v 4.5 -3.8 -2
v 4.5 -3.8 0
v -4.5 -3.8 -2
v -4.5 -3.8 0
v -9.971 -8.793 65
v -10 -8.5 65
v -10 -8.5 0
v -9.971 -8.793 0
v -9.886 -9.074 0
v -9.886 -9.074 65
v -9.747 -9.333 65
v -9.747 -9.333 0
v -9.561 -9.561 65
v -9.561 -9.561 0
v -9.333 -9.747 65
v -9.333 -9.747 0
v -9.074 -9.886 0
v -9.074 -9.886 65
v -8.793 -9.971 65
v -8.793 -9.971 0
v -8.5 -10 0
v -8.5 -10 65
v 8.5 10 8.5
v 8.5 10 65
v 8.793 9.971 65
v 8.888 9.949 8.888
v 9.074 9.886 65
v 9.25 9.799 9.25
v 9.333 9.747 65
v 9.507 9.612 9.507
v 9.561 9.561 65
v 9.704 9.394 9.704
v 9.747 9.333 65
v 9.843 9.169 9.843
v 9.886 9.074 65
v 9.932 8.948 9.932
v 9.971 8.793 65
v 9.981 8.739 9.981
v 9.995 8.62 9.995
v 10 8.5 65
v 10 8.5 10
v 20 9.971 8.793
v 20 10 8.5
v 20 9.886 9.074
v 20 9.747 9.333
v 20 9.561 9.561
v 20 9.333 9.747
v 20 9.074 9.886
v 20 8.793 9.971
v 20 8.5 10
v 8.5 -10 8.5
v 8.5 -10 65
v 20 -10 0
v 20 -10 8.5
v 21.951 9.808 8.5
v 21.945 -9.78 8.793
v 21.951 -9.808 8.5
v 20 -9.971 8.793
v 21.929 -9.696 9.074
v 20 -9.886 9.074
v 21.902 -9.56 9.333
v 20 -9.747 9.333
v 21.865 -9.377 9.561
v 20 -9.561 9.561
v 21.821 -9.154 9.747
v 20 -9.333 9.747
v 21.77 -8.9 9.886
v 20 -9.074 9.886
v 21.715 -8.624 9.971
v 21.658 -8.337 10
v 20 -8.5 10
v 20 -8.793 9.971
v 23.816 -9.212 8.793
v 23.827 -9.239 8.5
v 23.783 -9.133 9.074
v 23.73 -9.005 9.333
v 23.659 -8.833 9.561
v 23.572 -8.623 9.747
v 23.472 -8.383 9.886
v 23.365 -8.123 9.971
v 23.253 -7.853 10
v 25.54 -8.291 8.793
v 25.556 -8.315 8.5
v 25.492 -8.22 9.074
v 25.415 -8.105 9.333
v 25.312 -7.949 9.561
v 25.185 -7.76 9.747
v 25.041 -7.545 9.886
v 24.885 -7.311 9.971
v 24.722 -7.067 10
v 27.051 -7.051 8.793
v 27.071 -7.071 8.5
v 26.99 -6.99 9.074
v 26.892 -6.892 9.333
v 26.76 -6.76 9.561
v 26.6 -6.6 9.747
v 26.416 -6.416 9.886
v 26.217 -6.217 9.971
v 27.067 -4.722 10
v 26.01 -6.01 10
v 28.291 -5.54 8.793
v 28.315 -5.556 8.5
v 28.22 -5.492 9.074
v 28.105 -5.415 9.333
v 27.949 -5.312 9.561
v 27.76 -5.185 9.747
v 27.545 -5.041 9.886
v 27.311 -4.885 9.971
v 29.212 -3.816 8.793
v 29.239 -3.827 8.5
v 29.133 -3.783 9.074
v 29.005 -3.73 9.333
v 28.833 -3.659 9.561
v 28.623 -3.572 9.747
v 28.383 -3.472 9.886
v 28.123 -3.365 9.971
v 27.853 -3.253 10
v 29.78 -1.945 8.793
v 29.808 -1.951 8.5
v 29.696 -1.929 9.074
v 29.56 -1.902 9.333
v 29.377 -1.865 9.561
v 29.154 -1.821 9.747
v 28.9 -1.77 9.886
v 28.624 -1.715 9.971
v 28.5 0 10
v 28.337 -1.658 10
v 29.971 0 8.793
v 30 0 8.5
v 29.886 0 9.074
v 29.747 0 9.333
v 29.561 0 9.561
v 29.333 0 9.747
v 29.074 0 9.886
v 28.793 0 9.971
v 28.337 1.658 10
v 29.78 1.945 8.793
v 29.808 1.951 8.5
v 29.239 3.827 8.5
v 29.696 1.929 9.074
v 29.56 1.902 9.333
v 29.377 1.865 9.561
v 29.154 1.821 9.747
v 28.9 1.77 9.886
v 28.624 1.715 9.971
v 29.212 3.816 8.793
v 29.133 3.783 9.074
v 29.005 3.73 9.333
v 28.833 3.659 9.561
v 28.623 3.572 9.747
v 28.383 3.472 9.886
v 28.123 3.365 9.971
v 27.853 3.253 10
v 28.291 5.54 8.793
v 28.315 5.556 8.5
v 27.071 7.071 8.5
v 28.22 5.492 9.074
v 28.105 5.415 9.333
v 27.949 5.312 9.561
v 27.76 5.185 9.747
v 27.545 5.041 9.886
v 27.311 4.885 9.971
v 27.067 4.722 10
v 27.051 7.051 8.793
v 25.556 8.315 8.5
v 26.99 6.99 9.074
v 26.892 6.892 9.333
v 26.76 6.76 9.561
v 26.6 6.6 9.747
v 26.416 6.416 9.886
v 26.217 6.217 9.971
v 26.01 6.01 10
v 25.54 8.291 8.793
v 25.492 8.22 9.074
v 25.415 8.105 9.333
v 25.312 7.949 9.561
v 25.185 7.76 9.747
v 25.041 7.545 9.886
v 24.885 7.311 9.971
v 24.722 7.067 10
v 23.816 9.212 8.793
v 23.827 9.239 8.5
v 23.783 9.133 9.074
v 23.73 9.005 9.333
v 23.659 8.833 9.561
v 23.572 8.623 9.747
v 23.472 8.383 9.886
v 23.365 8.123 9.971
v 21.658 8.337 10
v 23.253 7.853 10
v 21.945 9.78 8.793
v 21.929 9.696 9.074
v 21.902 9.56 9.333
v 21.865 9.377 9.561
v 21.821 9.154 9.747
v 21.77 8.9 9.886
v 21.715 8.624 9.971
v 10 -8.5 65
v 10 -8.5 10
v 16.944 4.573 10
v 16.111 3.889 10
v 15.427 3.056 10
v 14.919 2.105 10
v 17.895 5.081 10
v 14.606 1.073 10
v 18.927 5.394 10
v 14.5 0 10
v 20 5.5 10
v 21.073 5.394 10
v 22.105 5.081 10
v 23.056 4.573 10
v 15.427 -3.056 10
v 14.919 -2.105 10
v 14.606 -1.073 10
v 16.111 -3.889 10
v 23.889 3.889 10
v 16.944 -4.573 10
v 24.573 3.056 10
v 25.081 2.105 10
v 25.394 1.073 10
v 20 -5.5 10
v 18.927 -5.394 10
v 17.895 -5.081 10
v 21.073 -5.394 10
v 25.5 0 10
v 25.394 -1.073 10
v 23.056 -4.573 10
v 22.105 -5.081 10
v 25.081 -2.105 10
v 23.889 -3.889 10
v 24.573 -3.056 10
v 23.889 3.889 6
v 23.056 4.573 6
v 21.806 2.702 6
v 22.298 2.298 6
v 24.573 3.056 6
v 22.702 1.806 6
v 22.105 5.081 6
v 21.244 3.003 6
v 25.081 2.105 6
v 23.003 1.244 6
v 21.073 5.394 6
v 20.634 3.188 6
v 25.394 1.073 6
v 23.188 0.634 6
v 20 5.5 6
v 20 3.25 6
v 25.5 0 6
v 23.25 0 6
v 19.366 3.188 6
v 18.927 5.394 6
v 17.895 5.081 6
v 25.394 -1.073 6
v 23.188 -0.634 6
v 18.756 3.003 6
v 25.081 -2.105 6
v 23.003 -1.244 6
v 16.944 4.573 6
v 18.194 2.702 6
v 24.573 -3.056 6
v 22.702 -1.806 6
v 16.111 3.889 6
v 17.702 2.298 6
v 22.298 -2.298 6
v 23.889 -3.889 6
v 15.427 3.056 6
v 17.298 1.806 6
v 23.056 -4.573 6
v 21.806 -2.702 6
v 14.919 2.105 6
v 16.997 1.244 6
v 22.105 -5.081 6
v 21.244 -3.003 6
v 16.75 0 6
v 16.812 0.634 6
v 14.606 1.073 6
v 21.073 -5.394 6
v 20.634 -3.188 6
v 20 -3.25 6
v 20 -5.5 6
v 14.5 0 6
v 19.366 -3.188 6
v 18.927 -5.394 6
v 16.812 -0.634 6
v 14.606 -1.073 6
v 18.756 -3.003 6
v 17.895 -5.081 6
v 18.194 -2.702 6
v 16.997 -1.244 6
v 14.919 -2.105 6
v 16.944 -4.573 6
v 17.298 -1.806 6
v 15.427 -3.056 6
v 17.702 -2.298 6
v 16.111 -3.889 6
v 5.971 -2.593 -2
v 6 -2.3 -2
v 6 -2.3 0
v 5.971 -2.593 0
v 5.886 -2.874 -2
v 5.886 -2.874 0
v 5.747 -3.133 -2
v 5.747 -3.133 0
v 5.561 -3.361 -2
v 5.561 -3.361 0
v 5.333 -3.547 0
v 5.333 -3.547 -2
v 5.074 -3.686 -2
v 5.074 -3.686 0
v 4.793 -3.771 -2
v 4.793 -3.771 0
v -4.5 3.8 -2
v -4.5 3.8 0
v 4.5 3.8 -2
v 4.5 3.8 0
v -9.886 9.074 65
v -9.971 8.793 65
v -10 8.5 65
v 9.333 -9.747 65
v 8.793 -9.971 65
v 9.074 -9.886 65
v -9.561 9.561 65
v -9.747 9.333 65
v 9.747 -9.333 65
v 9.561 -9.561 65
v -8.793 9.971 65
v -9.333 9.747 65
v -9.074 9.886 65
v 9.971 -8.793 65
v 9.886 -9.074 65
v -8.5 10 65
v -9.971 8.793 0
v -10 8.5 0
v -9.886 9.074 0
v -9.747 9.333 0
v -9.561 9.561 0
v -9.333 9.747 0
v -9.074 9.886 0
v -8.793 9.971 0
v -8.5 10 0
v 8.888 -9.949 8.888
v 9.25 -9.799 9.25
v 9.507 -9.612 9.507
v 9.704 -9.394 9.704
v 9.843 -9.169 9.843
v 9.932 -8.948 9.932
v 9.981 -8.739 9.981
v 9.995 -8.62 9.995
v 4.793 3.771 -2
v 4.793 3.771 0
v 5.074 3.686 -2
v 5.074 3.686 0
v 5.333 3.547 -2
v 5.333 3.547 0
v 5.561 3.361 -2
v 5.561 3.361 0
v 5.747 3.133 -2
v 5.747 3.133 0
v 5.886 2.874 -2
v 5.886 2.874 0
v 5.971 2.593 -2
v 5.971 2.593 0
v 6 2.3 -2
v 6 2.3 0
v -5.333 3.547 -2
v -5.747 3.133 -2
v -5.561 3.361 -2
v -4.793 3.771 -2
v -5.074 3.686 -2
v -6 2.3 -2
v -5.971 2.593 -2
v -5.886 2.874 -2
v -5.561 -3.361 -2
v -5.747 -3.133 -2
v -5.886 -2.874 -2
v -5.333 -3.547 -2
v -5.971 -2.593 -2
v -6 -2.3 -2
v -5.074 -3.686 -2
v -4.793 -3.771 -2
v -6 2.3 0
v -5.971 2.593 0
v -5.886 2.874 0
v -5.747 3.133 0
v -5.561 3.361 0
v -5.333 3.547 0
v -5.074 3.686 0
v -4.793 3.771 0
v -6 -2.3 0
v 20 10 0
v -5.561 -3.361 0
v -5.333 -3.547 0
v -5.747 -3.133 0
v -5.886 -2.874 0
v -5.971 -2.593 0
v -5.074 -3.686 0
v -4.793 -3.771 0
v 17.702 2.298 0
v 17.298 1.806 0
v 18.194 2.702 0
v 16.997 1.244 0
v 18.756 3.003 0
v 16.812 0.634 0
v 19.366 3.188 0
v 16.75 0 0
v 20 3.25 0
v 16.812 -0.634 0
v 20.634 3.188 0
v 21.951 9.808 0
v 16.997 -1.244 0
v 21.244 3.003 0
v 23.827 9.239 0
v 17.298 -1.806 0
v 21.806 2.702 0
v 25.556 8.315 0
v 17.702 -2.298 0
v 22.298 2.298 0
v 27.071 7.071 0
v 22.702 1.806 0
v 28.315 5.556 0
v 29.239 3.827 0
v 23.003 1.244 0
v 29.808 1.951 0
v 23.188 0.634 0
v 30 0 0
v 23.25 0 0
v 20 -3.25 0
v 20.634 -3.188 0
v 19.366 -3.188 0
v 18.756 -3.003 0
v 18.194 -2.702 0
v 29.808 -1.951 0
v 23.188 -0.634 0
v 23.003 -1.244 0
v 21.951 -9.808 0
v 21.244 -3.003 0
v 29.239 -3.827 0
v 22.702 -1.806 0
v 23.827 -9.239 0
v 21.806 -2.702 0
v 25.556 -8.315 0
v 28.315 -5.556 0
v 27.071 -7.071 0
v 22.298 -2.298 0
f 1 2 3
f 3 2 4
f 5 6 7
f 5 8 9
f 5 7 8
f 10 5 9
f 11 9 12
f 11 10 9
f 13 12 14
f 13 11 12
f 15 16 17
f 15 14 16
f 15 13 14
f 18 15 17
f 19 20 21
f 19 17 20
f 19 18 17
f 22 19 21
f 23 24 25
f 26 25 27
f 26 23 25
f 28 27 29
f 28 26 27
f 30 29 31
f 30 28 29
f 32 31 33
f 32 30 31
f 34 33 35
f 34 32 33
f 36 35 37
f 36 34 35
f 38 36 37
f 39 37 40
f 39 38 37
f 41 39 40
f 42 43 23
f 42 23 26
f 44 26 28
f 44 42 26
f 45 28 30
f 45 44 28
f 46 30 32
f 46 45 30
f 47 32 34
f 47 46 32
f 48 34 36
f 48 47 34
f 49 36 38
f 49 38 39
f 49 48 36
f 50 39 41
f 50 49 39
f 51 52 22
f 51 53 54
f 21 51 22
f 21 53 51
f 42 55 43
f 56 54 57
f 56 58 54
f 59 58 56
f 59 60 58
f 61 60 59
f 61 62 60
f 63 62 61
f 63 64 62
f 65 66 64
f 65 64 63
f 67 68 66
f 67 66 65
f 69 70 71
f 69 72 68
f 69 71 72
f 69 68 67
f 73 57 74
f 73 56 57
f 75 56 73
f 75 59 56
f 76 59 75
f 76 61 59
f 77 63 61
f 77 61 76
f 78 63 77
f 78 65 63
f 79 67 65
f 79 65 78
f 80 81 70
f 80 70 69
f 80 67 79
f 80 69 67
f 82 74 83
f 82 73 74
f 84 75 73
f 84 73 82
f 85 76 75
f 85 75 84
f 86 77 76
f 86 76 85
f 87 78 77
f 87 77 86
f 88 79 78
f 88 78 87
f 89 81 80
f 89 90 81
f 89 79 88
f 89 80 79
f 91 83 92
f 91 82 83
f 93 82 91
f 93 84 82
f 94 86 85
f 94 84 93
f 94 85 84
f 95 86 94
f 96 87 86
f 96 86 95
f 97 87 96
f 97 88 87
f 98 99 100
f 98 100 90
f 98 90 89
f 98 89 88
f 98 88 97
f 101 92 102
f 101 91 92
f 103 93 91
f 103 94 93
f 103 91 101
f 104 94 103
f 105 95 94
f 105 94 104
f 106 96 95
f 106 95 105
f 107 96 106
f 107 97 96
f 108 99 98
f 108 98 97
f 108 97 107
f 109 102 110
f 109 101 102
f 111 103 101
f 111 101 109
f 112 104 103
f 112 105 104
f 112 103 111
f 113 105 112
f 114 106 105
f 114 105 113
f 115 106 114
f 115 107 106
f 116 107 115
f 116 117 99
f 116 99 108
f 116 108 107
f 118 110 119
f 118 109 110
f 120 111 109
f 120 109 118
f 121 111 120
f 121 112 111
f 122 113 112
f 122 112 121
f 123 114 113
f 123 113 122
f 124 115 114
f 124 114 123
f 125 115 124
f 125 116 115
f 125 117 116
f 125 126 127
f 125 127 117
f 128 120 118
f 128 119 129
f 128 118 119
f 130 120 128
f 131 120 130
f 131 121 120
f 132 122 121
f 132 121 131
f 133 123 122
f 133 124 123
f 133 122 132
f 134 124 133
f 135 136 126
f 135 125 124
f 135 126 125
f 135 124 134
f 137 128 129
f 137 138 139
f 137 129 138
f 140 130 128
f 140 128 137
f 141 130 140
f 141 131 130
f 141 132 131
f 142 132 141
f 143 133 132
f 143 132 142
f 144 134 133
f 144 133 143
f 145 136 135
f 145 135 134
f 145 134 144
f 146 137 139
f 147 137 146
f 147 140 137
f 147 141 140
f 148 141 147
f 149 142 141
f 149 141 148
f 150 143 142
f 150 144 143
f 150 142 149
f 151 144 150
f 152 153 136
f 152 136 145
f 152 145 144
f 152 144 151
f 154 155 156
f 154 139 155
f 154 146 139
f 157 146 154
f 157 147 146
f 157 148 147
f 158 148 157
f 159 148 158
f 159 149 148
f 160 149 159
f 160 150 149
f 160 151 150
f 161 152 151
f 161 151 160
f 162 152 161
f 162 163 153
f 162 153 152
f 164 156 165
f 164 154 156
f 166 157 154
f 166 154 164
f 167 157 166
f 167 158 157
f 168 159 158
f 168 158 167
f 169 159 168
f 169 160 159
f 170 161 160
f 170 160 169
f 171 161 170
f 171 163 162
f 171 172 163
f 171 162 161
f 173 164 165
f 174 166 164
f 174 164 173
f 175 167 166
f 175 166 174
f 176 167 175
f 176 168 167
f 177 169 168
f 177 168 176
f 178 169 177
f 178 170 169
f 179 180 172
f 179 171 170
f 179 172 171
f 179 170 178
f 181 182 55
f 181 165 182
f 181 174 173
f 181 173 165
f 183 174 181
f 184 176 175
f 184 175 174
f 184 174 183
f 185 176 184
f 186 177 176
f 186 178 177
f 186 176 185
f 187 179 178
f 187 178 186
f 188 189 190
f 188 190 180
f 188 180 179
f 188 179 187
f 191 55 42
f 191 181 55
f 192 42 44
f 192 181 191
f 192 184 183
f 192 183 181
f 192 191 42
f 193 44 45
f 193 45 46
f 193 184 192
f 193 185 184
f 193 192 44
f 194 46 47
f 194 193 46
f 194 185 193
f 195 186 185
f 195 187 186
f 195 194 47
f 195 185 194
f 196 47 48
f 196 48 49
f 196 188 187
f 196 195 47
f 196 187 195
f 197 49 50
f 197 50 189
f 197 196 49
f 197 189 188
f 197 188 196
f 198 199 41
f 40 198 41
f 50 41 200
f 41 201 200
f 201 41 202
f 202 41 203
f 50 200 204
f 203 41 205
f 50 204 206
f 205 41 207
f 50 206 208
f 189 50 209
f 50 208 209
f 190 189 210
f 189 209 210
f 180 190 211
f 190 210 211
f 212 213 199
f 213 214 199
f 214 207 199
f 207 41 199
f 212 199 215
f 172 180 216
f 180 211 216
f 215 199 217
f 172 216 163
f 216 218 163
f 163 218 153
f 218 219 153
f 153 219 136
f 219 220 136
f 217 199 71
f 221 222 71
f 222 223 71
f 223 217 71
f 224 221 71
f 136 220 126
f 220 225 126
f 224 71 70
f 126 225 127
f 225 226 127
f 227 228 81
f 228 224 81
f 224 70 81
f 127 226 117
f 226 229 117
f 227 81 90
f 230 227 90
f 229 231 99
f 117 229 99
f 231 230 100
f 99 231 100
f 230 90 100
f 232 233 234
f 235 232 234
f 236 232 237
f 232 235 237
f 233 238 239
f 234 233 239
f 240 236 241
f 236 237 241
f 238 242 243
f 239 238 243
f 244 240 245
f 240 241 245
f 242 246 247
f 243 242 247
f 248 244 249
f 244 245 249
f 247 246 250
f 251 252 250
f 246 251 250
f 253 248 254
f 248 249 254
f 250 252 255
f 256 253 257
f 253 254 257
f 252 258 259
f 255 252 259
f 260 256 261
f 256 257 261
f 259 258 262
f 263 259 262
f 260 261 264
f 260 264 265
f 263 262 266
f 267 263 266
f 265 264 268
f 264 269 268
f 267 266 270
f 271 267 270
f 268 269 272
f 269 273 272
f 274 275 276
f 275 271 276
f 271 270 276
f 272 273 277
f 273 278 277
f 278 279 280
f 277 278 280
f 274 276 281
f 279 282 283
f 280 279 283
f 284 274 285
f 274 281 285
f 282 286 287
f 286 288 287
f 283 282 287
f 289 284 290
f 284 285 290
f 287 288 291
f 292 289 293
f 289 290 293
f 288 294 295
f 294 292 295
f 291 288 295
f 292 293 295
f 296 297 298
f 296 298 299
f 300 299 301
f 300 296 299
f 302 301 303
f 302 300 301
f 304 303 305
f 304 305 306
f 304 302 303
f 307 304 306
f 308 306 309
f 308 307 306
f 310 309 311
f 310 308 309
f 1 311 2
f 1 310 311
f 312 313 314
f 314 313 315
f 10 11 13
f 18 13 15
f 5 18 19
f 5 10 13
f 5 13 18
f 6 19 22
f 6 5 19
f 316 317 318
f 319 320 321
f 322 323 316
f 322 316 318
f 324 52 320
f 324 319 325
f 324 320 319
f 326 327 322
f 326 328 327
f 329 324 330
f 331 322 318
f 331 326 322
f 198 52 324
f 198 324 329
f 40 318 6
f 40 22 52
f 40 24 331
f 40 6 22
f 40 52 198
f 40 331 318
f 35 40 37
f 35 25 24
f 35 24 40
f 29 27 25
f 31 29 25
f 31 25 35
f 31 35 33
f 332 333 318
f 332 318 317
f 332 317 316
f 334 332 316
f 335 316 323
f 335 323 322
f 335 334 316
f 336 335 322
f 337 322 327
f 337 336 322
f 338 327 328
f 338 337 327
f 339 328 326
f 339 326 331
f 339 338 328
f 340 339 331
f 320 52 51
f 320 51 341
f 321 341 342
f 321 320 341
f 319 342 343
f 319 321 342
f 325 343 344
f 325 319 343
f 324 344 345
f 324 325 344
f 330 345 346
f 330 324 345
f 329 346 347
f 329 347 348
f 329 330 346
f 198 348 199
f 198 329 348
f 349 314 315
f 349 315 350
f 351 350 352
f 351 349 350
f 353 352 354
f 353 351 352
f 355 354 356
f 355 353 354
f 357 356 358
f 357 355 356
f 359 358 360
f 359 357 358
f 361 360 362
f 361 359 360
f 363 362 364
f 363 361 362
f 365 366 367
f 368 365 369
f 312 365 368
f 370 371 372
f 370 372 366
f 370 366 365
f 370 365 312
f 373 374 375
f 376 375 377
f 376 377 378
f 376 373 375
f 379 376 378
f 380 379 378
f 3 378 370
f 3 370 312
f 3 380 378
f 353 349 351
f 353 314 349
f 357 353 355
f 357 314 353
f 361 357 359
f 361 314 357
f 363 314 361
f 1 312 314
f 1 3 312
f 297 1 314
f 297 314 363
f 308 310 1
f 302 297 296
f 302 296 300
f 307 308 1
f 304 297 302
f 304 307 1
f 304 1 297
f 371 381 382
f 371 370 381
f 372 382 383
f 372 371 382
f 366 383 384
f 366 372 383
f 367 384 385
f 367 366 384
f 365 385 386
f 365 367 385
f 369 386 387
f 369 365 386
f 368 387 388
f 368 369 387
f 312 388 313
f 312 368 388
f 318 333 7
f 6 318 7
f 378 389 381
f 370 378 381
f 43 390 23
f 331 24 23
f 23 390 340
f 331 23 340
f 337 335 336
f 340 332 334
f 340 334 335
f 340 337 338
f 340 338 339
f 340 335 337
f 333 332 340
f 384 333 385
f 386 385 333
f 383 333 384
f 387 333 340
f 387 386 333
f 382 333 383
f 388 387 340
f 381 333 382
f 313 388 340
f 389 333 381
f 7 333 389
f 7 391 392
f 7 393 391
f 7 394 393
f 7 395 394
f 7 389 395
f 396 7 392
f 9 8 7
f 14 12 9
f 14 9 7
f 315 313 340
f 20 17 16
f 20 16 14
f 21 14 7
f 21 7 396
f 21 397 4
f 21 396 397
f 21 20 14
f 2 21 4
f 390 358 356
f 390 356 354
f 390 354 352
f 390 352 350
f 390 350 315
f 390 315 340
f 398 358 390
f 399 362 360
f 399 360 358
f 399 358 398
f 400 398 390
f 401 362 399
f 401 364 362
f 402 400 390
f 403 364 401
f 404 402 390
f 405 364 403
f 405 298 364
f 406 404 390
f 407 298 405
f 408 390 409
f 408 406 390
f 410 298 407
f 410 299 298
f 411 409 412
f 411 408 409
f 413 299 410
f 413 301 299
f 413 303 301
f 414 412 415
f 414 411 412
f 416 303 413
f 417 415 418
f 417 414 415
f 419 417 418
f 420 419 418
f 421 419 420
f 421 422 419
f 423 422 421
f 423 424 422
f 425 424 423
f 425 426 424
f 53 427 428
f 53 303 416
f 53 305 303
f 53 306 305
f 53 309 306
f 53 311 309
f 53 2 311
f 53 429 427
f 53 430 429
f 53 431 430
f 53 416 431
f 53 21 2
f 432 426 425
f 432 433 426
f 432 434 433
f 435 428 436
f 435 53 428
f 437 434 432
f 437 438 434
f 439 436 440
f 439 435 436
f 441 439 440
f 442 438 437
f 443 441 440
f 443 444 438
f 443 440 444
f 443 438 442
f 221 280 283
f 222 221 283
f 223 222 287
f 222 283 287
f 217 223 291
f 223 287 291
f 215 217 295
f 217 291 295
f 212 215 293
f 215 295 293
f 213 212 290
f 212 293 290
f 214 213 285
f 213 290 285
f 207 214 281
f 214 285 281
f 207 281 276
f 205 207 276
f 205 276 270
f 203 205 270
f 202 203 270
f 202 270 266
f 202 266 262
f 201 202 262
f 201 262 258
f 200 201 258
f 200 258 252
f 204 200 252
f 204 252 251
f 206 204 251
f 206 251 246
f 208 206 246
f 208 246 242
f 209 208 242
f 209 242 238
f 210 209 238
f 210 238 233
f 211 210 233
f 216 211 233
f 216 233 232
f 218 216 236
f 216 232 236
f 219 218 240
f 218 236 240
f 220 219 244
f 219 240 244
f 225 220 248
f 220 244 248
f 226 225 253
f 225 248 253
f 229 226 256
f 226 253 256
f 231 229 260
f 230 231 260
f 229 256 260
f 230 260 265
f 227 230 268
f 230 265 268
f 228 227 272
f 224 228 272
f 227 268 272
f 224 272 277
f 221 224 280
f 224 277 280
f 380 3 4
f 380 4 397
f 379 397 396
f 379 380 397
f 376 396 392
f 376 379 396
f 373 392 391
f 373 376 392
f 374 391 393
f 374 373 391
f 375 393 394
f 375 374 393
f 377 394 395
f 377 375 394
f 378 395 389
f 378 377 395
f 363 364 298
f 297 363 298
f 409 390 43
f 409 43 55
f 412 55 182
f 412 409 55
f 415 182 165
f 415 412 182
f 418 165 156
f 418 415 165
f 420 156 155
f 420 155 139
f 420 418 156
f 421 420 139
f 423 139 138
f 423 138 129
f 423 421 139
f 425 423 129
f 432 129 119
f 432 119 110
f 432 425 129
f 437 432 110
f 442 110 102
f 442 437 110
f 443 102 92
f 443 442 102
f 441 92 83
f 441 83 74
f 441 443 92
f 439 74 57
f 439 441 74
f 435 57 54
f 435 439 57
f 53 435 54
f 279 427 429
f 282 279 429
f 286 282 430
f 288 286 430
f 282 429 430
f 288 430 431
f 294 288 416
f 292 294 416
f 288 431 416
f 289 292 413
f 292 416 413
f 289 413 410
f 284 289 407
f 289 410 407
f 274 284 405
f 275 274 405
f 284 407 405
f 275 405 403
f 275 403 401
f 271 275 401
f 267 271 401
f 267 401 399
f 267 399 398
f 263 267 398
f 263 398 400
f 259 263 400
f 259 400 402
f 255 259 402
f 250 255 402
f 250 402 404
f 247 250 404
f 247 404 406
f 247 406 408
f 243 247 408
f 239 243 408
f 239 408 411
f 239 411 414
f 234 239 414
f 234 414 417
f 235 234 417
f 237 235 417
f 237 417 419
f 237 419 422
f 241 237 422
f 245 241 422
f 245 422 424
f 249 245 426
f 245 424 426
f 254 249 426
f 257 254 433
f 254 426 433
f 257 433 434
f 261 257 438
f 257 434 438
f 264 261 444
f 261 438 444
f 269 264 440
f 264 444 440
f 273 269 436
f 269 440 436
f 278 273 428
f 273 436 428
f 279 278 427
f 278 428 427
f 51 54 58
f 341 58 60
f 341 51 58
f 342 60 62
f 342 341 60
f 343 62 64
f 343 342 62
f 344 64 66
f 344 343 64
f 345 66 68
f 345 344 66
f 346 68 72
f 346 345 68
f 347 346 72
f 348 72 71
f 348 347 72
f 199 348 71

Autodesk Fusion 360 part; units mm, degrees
sketch "Sketch1" plane through (0, 0, 0) normal (0, 0, 1) x (1, 0, 0)
  line L0 (9, 9) -> (-9, 9)
  line L1 (-9, 9) -> (-9, -9)
  line L2 (-9, -9) -> (9, -9)
  line L3 (9, -9) -> (9, 9)
  line L4 (9, 9) -> (-9, -9) construction
  line L5 (-9, 9) -> (9, -9) construction
  dimension "d1" = 18
  dimension "d2" = 18
extrude "Extrude1" add sketch "Sketch1" along normal blind 35

Autodesk Fusion 360 part; units mm, degrees
sketch "Sketch1" plane through (0, 0, 0) normal (0, 0, 1) x (1, 0, 0)
  line L0 (-10, -10) -> (10, -10)
  line L1 (10, -10) -> (10, 10)
  line L2 (10, 10) -> (-10, 10)
  line L3 (-10, 10) -> (-10, -10)
  line L4 (-10, -10) -> (10, 10) construction
  line L5 (10, -10) -> (-10, 10) construction
  dimension "d1" = 20
  dimension "d2" = 20
extrude "Extrude1" add sketch "Sketch1" along normal blind 65
sketch "Sketch2" plane through (0, 0, 0) normal (0, 0, -1) x (1, 0, 0)
  line L0 (-10, 10) -> (-10, -10)
  line L1 (-10, -10) -> (10, -10)
  line L2 (10, -10) -> (10, 10)
  line L3 (10, 10) -> (-10, 10)
  line L4 (10, 10) -> (10, -10)
  line L5 (10, -10) -> (10, 10)
  line L6 (10, 10) -> (30, 10) construction
  line L7 (30, 10) -> (30, -10) construction
  line L8 (30, -10) -> (10, -10) construction
  arc A0 (20, -10) -> (20, 10) centre (20, 0) ccw
  line L9 (20, -10) -> (10, -10) construction
  line L10 (10, -10) -> (10, 10) construction
  line L11 (20, -10) -> (10, -10)
  line L12 (20, 10) -> (10, 10)
  point P0 (10, -10)
  point P1 (10, 10)
  dimension "d5" = 20
extrude "Extrude2" add sketch "Sketch2" against normal blind 10 contours L2 L4 L5 A0 L11 L12
sketch "Sketch4" plane through (0, 0, 10) normal (0, 0, 1) x (-1, 0, 0)
  arc A0 (-20, 10) -> (-20, -10) centre (-20, 0) ccw
  line L0 (-20, -10) -> (-10, -10)
  line L1 (-10, -10) -> (-10, 10)
  line L2 (-10, 10) -> (-20, 10)
  line L3 (-20, 10) -> (-20, -10) construction
  point P0 (-20, 10)
  point P1 (-20, -10)
hole "Hole1" at (20, 0, 10) direction (0, 0, -1) diameter 6.5 depth 10 tip angle 180 counterbore diameter 11 counterbore depth 4
sketch "Sketch5" plane through (0, 0, 0) normal (0, 0, -1) x (1, 0, 0)
  circle A0 centre (20, 0) radius 3.25
  line L0 (-10, 10) -> (-10, -10)
  line L1 (-10, -10) -> (20, -10)
  arc A1 (20, -10) -> (20, 10) centre (20, 0) ccw
  line L2 (20, 10) -> (-10, 10)
  line L3 (6, 3.8) -> (-6, 3.8)
  line L4 (-6, 3.8) -> (-6, -3.8)
  line L5 (-6, -3.8) -> (6, -3.8)
  line L6 (6, -3.8) -> (6, 3.8)
  line L7 (6, 3.8) -> (-6, -3.8) construction
  line L8 (-6, 3.8) -> (6, -3.8) construction
  dimension "d13" = 12
  dimension "d14" = 7.6
extrude "Extrude3" add sketch "Sketch5" along normal blind 2 contours L3 L4 L5 L6
fillet "Fillet1" radius 1.5 11 edges at (-10, 10, 32.5) (-10, -10, 32.5) (10, -10, 37.5) (15, -10, 10) (30, 0, 10) (15, 10, 10) (10, 10, 37.5) (6, 3.8, -1) (6, -3.8, -1) (-6, -3.8, -1) (-6, 3.8, -1)
